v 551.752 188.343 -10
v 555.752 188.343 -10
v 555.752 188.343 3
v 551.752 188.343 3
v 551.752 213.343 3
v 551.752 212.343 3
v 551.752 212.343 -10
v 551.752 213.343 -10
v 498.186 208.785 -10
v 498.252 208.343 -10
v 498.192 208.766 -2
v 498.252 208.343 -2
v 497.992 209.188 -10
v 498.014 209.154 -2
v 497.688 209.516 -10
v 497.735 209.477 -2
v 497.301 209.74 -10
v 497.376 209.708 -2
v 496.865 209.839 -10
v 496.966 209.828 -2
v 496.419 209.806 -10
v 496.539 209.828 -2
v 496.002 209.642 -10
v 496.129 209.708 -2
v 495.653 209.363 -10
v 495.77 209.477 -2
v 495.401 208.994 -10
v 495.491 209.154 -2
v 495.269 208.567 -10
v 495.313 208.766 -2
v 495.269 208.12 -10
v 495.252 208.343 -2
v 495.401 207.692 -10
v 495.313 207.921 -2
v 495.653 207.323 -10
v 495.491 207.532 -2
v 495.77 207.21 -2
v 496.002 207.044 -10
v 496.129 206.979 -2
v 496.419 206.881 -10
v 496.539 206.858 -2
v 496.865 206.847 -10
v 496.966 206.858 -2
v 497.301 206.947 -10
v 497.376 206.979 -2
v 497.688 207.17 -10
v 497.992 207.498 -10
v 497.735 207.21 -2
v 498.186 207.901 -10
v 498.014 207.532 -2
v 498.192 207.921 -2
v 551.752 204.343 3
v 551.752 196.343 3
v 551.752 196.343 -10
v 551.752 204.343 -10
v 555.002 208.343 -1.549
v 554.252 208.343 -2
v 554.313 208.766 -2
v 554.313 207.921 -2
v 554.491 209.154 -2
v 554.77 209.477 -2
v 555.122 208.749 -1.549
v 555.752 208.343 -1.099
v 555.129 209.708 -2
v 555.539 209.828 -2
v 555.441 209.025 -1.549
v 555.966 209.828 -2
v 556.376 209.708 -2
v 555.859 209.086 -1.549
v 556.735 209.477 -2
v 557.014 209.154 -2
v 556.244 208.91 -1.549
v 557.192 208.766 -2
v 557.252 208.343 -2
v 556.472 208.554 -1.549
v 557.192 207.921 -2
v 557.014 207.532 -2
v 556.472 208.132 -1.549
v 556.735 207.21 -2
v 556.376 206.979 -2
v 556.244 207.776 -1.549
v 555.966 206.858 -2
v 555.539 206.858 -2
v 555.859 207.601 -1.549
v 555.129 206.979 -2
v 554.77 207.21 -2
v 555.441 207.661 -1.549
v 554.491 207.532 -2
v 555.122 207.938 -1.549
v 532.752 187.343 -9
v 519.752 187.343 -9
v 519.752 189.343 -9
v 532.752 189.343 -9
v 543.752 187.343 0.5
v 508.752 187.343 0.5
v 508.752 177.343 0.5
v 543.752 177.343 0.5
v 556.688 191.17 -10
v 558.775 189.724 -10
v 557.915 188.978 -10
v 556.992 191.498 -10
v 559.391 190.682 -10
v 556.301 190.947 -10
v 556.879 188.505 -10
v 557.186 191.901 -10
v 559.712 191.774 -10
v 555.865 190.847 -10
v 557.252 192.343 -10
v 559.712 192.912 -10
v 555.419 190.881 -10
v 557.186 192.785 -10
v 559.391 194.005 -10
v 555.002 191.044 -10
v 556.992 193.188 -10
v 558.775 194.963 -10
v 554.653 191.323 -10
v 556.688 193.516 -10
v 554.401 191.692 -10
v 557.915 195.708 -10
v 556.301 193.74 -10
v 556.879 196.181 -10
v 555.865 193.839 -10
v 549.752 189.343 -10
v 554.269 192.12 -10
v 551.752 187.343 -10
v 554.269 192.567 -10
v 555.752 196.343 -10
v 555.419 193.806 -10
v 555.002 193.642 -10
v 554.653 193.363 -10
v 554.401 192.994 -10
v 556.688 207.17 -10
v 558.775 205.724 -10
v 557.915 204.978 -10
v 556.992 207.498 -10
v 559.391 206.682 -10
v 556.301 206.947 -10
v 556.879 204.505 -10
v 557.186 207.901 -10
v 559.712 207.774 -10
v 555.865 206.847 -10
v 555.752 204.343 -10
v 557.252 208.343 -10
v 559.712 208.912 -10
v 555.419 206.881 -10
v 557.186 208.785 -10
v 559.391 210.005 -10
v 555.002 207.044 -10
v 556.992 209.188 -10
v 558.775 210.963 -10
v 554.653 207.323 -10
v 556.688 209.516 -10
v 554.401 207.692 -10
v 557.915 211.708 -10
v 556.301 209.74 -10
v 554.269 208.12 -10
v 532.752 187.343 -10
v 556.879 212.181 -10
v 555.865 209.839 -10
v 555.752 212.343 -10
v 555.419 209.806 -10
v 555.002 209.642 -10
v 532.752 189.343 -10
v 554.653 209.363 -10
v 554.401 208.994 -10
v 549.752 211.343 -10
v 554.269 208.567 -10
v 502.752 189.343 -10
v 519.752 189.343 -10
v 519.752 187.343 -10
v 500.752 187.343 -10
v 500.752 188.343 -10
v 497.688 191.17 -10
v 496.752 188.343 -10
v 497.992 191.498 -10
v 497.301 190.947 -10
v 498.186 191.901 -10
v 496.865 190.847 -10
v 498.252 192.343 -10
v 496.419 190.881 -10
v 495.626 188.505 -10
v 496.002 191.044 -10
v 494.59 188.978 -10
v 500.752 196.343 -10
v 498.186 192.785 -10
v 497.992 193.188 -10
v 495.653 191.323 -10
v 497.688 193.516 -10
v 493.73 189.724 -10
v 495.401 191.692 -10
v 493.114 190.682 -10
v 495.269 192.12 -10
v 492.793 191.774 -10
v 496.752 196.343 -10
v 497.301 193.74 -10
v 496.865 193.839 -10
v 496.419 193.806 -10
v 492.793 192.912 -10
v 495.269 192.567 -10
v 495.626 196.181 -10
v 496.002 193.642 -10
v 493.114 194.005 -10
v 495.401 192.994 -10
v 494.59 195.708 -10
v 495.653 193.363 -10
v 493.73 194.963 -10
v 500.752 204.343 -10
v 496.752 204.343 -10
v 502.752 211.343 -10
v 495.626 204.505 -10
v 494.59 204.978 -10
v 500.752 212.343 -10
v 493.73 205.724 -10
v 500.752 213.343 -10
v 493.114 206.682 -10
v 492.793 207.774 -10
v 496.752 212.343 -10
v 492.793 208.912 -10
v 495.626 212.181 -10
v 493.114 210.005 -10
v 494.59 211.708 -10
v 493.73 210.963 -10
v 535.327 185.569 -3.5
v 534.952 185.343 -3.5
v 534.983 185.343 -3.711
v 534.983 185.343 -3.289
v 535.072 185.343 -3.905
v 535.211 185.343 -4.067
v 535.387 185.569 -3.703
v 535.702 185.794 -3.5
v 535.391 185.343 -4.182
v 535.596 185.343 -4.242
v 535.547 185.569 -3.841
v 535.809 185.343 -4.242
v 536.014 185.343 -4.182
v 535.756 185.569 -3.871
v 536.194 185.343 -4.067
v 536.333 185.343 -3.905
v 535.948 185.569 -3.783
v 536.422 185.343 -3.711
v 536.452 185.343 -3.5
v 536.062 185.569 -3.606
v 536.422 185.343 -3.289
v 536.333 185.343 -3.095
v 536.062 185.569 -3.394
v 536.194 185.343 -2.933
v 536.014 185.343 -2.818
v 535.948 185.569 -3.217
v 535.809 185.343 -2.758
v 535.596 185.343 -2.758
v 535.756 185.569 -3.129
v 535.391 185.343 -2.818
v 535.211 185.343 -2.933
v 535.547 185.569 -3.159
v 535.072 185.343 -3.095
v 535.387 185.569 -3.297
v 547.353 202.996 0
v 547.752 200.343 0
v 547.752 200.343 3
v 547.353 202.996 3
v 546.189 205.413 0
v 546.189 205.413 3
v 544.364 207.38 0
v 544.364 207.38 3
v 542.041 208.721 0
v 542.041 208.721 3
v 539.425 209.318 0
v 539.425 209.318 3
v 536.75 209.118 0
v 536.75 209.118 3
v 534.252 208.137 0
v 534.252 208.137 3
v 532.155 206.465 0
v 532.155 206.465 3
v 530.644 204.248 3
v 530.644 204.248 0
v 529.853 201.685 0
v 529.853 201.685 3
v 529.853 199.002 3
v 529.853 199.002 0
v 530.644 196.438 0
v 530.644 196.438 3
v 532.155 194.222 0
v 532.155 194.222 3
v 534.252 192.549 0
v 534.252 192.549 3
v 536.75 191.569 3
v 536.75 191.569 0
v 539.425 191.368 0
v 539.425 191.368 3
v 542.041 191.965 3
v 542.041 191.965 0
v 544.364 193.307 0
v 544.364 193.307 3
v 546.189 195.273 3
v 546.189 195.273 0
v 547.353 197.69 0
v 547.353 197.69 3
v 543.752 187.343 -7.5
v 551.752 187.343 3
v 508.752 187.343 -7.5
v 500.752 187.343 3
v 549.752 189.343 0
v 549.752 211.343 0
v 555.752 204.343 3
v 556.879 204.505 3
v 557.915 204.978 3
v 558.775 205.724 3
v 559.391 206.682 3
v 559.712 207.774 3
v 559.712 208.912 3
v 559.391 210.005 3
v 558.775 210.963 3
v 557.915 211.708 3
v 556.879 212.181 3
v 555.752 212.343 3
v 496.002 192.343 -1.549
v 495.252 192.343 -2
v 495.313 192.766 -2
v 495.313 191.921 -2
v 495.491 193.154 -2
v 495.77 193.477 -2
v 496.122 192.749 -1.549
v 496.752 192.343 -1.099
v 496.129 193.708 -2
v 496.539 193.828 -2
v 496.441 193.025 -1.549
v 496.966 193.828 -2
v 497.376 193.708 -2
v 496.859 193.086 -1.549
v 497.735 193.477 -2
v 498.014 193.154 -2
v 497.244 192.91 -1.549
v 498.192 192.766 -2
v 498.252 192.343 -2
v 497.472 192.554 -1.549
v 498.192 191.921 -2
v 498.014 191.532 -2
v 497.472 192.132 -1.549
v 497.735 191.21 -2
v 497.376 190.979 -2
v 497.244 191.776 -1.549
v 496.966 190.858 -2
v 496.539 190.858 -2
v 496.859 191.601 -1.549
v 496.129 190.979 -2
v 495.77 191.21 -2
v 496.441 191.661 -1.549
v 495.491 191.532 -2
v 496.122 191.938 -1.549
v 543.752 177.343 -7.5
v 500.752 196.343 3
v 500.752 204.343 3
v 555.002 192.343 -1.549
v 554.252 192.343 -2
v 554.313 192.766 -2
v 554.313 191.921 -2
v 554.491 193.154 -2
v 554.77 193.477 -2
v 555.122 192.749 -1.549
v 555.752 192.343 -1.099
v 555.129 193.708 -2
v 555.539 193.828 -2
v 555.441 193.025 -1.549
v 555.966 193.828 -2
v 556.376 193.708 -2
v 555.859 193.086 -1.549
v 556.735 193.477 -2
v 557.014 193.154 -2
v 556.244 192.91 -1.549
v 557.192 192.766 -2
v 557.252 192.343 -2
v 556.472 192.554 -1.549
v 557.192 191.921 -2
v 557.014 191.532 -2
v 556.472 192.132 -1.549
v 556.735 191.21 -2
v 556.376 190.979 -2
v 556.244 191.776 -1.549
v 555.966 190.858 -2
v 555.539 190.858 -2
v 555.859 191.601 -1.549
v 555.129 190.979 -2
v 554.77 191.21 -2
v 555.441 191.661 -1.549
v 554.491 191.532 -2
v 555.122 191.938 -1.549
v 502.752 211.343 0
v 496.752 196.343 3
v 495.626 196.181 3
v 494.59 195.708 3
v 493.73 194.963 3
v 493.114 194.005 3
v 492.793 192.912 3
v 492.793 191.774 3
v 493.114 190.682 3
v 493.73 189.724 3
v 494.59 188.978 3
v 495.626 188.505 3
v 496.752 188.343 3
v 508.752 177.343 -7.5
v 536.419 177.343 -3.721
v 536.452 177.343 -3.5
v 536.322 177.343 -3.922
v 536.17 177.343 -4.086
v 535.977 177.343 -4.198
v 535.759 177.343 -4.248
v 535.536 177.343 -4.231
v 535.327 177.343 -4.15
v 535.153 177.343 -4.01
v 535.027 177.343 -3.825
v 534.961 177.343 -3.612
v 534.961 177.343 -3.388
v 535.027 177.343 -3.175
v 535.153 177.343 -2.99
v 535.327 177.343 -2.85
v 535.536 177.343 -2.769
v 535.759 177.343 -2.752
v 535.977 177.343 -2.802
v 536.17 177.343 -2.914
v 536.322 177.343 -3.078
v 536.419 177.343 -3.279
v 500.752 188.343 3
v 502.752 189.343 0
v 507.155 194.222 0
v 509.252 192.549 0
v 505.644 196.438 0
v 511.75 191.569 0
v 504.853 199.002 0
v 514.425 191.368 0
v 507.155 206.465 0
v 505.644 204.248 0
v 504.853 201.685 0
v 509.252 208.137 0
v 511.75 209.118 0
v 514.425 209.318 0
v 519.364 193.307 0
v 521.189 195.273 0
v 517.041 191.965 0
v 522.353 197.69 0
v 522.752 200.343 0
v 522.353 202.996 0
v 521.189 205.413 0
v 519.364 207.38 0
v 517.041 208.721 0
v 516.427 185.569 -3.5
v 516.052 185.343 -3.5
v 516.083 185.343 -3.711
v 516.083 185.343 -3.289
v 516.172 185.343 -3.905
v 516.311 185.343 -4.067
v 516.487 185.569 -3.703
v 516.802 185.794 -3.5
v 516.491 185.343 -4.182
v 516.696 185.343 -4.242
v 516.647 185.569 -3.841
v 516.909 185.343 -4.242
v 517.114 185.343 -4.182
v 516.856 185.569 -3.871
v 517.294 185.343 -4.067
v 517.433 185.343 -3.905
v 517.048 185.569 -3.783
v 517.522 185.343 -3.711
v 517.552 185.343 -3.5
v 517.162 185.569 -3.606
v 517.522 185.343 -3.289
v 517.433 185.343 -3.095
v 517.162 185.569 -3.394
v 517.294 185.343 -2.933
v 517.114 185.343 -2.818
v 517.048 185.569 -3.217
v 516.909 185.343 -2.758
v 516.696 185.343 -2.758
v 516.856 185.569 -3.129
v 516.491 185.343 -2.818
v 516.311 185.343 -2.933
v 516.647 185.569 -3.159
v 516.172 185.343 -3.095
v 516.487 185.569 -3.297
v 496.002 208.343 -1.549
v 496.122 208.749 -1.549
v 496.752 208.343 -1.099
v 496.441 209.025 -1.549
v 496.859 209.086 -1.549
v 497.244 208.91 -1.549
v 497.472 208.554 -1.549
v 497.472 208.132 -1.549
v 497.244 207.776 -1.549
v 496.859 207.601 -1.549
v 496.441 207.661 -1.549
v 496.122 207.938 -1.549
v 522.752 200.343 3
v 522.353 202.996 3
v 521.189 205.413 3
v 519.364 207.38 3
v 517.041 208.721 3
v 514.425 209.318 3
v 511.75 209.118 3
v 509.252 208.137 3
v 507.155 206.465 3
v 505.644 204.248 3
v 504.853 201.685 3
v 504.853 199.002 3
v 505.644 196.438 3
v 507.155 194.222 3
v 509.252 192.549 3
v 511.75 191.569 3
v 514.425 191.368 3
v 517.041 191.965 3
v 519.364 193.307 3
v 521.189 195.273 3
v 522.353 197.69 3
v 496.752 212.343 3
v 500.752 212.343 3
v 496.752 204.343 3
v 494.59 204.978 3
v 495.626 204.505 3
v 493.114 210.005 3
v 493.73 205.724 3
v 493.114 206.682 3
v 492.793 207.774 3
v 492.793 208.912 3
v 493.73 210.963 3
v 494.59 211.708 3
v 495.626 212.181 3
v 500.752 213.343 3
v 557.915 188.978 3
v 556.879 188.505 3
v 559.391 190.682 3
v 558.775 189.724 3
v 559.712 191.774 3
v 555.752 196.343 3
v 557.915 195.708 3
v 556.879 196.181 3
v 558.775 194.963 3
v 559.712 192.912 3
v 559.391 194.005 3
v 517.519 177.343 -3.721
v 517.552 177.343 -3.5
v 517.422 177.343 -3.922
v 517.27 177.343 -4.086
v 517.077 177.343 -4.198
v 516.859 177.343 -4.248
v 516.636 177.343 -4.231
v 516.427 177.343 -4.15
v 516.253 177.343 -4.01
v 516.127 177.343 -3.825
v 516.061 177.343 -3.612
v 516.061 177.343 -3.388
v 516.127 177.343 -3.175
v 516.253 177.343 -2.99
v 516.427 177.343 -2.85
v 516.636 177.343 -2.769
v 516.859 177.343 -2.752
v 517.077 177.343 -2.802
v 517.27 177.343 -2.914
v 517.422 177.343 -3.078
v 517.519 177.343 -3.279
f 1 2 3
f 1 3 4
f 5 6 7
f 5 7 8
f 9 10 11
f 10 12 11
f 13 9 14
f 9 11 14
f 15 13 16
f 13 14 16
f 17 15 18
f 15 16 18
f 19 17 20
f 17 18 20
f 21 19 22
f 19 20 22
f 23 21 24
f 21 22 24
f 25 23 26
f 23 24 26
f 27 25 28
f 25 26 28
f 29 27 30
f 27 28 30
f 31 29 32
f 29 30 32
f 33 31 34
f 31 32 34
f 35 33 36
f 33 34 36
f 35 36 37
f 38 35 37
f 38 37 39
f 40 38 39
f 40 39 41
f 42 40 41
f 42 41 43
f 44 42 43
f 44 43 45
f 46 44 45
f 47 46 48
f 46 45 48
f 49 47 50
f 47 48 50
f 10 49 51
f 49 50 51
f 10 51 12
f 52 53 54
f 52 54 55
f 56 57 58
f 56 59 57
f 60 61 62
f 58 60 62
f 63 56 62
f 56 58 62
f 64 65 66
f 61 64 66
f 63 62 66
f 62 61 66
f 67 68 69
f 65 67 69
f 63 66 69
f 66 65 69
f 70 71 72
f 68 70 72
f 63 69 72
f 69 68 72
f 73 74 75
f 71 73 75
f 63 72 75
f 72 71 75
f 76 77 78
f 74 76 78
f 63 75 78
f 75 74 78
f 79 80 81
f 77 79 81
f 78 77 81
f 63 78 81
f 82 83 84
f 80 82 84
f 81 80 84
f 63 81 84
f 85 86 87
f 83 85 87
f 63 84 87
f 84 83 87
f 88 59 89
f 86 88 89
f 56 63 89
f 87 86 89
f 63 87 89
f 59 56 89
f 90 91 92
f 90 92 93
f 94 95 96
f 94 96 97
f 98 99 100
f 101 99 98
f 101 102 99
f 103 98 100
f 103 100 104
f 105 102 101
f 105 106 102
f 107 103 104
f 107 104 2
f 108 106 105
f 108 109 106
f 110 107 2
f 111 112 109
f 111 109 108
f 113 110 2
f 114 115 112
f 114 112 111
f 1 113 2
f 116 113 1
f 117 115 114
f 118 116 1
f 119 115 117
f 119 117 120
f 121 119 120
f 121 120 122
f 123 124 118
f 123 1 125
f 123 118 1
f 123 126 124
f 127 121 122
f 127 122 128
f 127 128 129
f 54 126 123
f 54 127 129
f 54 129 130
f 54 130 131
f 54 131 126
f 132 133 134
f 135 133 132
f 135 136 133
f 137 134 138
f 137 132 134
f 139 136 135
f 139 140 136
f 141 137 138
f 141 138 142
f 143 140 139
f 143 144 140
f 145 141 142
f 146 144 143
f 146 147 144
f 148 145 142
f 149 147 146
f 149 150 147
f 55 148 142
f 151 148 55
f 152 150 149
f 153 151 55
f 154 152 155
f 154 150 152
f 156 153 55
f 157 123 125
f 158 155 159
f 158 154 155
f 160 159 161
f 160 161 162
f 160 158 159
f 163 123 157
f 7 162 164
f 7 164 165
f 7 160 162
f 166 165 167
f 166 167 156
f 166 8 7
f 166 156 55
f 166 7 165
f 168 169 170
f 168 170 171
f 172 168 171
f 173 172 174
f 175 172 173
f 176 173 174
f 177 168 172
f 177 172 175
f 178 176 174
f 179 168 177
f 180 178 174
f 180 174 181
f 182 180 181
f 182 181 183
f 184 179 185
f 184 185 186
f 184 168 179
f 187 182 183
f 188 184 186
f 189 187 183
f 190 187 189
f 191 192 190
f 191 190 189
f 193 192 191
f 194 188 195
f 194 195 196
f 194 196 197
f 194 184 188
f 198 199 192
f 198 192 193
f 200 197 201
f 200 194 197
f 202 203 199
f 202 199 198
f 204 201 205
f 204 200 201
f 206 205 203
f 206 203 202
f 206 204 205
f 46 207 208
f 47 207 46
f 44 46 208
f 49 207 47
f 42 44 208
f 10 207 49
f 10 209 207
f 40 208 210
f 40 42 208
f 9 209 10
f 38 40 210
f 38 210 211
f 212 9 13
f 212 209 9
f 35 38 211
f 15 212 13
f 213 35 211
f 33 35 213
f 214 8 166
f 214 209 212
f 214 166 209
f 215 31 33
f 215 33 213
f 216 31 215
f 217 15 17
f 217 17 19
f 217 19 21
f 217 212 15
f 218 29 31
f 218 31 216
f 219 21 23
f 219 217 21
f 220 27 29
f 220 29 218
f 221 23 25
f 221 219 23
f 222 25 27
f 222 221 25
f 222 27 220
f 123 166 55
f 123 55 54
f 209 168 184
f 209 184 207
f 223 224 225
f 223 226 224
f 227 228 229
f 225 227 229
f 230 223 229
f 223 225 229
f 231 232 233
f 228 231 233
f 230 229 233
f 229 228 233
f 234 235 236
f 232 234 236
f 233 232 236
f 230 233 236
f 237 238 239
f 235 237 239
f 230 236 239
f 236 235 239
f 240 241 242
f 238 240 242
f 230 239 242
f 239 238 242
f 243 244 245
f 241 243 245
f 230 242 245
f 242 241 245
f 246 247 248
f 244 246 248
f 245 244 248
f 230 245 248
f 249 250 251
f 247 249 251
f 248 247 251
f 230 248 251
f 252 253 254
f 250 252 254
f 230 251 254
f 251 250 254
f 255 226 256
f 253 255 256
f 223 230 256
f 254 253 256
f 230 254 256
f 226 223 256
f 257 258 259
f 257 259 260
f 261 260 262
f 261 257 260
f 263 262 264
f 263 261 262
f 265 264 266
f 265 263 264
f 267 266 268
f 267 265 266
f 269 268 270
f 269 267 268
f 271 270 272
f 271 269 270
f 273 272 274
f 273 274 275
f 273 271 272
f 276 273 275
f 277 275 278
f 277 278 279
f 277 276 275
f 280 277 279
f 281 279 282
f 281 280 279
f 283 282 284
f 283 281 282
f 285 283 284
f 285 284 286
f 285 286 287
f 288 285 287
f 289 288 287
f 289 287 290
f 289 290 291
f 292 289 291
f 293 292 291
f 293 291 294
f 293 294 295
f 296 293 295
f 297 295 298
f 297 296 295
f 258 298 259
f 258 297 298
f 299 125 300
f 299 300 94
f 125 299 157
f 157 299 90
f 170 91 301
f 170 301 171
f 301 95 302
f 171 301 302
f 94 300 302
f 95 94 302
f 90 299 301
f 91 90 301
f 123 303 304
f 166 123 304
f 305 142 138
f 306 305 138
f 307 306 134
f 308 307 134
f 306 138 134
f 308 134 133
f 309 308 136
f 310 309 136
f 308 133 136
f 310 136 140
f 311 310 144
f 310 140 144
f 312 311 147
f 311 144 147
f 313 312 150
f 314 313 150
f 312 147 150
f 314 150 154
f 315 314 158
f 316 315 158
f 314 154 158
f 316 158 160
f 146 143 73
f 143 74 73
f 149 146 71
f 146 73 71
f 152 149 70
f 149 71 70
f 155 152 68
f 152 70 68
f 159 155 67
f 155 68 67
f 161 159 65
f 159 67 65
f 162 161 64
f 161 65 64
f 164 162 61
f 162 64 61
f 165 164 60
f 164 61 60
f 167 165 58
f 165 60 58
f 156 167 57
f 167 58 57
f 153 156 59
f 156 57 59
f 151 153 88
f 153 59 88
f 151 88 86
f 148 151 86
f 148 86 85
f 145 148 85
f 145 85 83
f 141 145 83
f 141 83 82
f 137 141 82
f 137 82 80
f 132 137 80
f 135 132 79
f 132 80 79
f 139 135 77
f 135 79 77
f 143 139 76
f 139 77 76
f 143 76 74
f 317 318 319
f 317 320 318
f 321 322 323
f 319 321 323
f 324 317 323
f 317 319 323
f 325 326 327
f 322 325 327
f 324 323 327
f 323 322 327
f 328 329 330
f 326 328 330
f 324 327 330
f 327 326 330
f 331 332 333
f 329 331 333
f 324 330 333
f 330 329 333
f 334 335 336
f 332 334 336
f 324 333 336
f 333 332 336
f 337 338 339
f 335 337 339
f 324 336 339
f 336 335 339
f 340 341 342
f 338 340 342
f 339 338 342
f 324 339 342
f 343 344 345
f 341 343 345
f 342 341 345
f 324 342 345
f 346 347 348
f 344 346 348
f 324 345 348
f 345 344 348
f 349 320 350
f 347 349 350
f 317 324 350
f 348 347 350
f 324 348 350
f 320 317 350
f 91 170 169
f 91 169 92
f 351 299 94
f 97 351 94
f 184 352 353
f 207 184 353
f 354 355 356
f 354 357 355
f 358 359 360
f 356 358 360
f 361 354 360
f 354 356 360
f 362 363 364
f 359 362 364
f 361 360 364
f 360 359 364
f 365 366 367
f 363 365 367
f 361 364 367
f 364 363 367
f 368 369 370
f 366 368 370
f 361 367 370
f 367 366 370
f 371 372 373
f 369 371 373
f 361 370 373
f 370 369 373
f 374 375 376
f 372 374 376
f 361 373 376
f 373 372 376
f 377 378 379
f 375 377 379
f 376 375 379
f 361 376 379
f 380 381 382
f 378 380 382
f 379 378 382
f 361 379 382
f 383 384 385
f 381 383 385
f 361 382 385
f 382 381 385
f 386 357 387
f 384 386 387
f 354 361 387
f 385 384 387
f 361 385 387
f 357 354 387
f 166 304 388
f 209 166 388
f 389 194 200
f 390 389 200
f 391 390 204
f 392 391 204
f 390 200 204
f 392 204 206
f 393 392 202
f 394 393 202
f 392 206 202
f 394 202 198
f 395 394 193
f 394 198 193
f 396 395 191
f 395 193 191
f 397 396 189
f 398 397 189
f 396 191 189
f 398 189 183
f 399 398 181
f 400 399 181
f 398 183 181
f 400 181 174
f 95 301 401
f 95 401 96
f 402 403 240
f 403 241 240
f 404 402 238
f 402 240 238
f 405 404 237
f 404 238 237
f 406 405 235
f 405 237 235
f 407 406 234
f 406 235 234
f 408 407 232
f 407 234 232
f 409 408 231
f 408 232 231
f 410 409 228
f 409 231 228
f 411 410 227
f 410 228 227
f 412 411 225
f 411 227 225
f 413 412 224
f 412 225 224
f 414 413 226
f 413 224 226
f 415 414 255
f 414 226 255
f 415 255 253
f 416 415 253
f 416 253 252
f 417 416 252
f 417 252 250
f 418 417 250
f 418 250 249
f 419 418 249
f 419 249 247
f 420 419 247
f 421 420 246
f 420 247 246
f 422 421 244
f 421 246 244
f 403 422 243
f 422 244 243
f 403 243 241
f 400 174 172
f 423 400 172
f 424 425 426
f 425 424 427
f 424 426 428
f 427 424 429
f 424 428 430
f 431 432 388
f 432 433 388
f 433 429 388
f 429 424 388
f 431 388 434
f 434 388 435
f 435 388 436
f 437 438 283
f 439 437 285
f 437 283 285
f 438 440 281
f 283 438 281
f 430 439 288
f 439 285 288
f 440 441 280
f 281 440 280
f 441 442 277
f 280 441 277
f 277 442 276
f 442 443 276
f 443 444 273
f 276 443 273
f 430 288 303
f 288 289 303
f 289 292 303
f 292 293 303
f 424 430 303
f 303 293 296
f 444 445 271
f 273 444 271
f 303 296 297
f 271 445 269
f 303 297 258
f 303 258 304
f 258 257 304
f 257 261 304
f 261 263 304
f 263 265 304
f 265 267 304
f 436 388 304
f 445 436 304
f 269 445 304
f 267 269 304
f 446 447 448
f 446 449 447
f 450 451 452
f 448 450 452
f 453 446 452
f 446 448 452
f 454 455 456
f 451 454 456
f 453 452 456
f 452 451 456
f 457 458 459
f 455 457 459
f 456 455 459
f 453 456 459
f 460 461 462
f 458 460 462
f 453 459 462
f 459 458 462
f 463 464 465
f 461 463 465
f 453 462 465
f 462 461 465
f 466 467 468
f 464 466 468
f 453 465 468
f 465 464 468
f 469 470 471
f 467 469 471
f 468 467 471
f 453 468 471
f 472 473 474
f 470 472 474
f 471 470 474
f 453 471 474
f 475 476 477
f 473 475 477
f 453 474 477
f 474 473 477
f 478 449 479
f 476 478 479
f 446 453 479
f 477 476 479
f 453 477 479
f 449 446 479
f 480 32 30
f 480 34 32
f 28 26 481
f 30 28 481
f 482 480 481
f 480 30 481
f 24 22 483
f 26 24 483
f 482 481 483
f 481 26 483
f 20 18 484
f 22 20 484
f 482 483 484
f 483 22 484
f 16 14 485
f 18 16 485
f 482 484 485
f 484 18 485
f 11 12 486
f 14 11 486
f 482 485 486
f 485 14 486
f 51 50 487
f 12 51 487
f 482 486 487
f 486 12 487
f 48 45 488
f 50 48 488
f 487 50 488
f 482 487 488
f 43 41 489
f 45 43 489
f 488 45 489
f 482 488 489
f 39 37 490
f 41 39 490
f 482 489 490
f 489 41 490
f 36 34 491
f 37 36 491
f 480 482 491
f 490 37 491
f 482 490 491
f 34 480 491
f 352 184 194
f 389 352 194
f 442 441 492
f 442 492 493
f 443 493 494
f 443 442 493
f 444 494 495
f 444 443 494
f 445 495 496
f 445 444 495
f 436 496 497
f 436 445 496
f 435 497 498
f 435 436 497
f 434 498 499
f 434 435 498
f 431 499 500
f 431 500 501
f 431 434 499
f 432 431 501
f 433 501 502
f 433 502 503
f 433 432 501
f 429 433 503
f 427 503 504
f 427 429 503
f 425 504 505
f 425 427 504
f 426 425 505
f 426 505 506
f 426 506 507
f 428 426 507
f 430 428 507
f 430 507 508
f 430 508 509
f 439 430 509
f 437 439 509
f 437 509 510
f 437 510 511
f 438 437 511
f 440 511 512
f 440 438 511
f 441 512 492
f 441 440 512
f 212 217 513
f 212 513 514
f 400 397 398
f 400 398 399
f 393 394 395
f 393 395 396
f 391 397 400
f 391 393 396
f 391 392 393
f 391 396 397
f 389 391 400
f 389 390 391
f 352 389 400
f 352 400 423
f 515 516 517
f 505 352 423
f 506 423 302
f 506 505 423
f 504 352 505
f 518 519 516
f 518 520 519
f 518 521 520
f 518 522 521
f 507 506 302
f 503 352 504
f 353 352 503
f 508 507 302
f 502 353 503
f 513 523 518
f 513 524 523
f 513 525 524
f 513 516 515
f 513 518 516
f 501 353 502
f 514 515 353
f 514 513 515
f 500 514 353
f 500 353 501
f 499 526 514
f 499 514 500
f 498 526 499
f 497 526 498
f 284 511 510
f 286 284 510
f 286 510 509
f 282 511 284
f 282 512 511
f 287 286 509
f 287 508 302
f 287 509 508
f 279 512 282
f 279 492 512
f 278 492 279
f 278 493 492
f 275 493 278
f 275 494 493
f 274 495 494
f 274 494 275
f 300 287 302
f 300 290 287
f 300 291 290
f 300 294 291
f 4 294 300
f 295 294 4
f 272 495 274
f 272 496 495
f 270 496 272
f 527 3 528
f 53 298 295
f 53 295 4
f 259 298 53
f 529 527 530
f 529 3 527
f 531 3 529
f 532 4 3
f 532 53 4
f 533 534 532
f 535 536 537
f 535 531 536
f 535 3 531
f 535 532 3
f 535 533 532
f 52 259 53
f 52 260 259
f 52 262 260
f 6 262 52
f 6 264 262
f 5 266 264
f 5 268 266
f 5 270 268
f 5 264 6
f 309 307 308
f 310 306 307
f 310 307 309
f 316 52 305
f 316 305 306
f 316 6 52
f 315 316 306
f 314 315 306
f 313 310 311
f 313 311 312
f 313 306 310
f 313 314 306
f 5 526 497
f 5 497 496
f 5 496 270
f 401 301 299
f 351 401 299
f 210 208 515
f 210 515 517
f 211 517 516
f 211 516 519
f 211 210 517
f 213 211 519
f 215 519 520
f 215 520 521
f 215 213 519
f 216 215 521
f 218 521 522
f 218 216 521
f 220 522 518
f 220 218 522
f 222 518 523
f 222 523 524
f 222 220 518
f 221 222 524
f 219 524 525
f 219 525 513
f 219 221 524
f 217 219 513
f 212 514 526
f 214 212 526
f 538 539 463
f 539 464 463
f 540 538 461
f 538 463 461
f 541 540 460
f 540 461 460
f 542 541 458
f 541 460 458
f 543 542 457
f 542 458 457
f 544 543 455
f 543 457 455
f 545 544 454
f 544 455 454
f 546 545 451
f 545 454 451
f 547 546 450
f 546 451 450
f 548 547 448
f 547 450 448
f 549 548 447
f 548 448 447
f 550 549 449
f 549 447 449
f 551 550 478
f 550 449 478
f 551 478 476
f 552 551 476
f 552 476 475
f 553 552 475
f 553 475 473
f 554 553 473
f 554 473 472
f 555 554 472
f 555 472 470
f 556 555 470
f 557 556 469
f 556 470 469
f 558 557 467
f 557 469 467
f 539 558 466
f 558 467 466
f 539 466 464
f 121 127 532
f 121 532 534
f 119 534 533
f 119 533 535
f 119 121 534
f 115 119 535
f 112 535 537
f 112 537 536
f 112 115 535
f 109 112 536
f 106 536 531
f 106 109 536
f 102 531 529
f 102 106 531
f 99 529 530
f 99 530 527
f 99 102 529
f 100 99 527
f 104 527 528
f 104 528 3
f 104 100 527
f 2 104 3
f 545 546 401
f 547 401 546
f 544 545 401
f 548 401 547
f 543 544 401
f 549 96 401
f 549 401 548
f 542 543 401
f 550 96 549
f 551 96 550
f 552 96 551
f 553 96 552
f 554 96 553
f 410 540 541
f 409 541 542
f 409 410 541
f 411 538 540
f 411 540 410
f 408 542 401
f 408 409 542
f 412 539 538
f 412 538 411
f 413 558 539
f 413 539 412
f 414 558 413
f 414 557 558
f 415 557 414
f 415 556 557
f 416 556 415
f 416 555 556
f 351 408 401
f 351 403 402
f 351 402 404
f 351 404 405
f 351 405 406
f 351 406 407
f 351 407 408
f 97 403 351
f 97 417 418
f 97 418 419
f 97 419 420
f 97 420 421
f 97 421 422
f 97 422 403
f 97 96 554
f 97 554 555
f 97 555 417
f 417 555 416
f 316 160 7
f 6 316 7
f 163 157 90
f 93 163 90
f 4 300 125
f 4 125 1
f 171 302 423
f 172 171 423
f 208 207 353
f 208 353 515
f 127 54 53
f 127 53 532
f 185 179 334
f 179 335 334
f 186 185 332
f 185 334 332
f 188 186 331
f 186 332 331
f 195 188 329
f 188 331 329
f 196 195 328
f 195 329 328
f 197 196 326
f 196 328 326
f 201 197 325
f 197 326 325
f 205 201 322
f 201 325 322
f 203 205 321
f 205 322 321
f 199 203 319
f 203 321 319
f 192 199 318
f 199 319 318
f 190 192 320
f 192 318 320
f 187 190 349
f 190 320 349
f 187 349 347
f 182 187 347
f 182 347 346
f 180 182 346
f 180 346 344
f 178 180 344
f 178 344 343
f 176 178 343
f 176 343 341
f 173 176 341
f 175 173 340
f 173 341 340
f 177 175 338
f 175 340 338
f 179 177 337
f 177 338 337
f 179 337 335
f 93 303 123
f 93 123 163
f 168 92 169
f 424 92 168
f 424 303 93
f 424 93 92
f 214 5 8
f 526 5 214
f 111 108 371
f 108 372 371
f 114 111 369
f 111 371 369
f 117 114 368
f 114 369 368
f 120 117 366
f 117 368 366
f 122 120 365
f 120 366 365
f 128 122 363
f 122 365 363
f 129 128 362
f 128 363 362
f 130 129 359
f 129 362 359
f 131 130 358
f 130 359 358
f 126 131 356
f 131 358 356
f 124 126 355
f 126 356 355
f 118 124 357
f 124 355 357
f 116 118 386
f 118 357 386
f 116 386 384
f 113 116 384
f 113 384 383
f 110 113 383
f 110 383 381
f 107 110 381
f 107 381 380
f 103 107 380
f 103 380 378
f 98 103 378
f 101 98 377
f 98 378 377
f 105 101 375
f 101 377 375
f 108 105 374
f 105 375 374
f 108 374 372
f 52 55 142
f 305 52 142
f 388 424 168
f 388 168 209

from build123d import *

# Parameters (mm, degrees)
SKIZZE1_W                            = 51
SKIZZE1_H                            = 26
SKIZZE1_R                            = 9
AUFSATZ_LINEAR_AUSTRAGEN1_DEPTH      = 3
SKIZZE3_W                            = 51
SKIZZE3_H                            = 26
SKIZZE3_W_2                          = 47
SKIZZE3_H_2                          = 22
AUFSATZ_LINEAR_AUSTRAGEN3_DEPTH      = 10
AUFSATZ_LINEAR_AUSTRAGEN4_DEPTH      = 13
F_3_0_3_DURCHMESSER_BOHRUNG1_D       = 3
F_3_0_3_DURCHMESSER_BOHRUNG1_DEPTH   = 8
F_3_0_3_DURCHMESSER_BOHRUNG1_TIP     = 0.901290929
SCHNITT_LINEAR_AUSTRAGEN1_REACH      = 562.445
SKIZZE8_W                            = 13
SKIZZE8_H                            = 1
SKIZZE10_W                           = 35
SKIZZE10_H                           = 8
AUFSATZ_LINEAR_AUSTRAGEN5_DEPTH      = 10
F_1_5_1_5_DURCHMESSER_BOHRUNG1_D     = 1.5
F_1_5_1_5_DURCHMESSER_BOHRUNG1_DEPTH = 8
F_1_5_1_5_DURCHMESSER_BOHRUNG1_TIP   = 0.450645464


with BuildPart() as part:
    # Skizze1 → Aufsatz-Linear austragen1 (new body)
    with BuildSketch(Plane.XY):
        with Locations((526.252498469, 200.343199998)):
            Rectangle(SKIZZE1_W, SKIZZE1_H)
        with Locations((513.752498469, 200.343199998)):
            Circle(SKIZZE1_R, mode=Mode.SUBTRACT)
        with Locations((538.752498469, 200.343199998)):
            Circle(SKIZZE1_R, mode=Mode.SUBTRACT)
    extrude(amount=AUFSATZ_LINEAR_AUSTRAGEN1_DEPTH)

    # Skizze3 → Aufsatz-Linear austragen3 (add)
    with BuildSketch(Plane(origin=(0, 0, 0), x_dir=(-1, 0, 0), z_dir=(0, 0, -1))):
        with Locations((-526.252498469, 200.343199998)):
            Rectangle(SKIZZE3_W, SKIZZE3_H)
        with Locations((-526.252498469, 200.343199998)):
            Rectangle(SKIZZE3_W_2, SKIZZE3_H_2, mode=Mode.SUBTRACT)
    extrude(amount=AUFSATZ_LINEAR_AUSTRAGEN3_DEPTH)

    # Skizze4 → Aufsatz-Linear austragen4 (add)
    with BuildSketch(Plane(origin=(0, 0, -10), x_dir=(-1, 0, 0), z_dir=(0, 0, -1))):
        with BuildLine():
            Line((-496.752498469, 212.343199998), (-500.752498469, 212.343199998))
            Line((-500.752498469, 212.343199998), (-500.752498469, 204.343199998))
            Line((-500.752498469, 204.343199998), (-496.752498469, 204.343199998))
            ThreePointArc((-496.752498469, 204.343199998), (-492.752498469, 208.343199998), (-496.752498469, 212.343199998))
        make_face()
        with BuildLine():
            Line((-500.752498469, 196.343199998), (-496.752498469, 196.343199998))
            ThreePointArc((-496.752498469, 196.343199998), (-492.752498469, 192.343199998), (-496.752498469, 188.343199998))
            Line((-496.752498469, 188.343199998), (-500.752498469, 188.343199998))
            Line((-500.752498469, 188.343199998), (-500.752498469, 196.343199998))
        make_face()
        with BuildLine():
            Line((-551.752498469, 188.343199998), (-551.752498469, 196.343199998))
            Line((-551.752498469, 196.343199998), (-555.752498469, 196.343199998))
            ThreePointArc((-555.752498469, 196.343199998), (-559.752498469, 192.343199998), (-555.752498469, 188.343199998))
            Line((-555.752498469, 188.343199998), (-551.752498469, 188.343199998))
        make_face()
        with BuildLine():
            Line((-551.752498469, 204.343199998), (-555.752498469, 204.343199998))
            ThreePointArc((-555.752498469, 204.343199998), (-559.752498469, 208.343199998), (-555.752498469, 212.343199998))
            Line((-555.752498469, 212.343199998), (-551.752498469, 212.343199998))
            Line((-551.752498469, 212.343199998), (-551.752498469, 204.343199998))
        make_face()
    extrude(amount=-AUFSATZ_LINEAR_AUSTRAGEN4_DEPTH)

    # Ø3.0 (3) Durchmesser Bohrung1
    with Locations(Plane(origin=(0, 0, -10), x_dir=(-1, 0, 0), z_dir=(0, 0, -1))):
        with Locations((-555.752498469, 208.343199998), (-555.752498469, 192.343199998), (-496.752498469, 208.343199998), (-496.752498469, 192.343199998)):
            Hole(F_3_0_3_DURCHMESSER_BOHRUNG1_D / 2, depth=F_3_0_3_DURCHMESSER_BOHRUNG1_DEPTH)
            with Locations((0, 0, -(F_3_0_3_DURCHMESSER_BOHRUNG1_DEPTH + F_3_0_3_DURCHMESSER_BOHRUNG1_TIP / 2))):  # 118° drill point
                Cone(0, F_3_0_3_DURCHMESSER_BOHRUNG1_D / 2, F_3_0_3_DURCHMESSER_BOHRUNG1_TIP, mode=Mode.SUBTRACT)

    # Skizze8 → Schnitt-Linear austragen1 (cut, up to next)
    with BuildSketch(Plane.XZ.offset(-187.343199998), mode=Mode.PRIVATE) as schnitt_linear_austragen1_sk1:
        with Locations((526.252498469, -9.5)):
            Rectangle(SKIZZE8_W, SKIZZE8_H)
    schnitt_linear_austragen1_tool1 = extrude(schnitt_linear_austragen1_sk1.sketch, amount=-SCHNITT_LINEAR_AUSTRAGEN1_REACH, mode=Mode.PRIVATE) & part.part
    add(schnitt_linear_austragen1_tool1.solids().sort_by_distance((526.252498, 187.3432, -9.5))[0], mode=Mode.SUBTRACT)

    # Skizze10 → Aufsatz-Linear austragen5 (add)
    with BuildSketch(Plane.XZ.offset(-187.343199998)):
        with Locations((526.252498469, -3.5)):
            Rectangle(SKIZZE10_W, SKIZZE10_H)
    extrude(amount=AUFSATZ_LINEAR_AUSTRAGEN5_DEPTH)

    # Ø1.5 (1.5) Durchmesser Bohrung1
    with Locations(Plane(origin=(0, 177.343199998, 0), x_dir=(-1, 0, 0), z_dir=(0, -1, 0))):
        with Locations((-535.702498469, 3.5), (-516.802498469, 3.5)):
            Hole(F_1_5_1_5_DURCHMESSER_BOHRUNG1_D / 2, depth=F_1_5_1_5_DURCHMESSER_BOHRUNG1_DEPTH)
            with Locations((0, 0, -(F_1_5_1_5_DURCHMESSER_BOHRUNG1_DEPTH + F_1_5_1_5_DURCHMESSER_BOHRUNG1_TIP / 2))):  # 118° drill point
                Cone(0, F_1_5_1_5_DURCHMESSER_BOHRUNG1_D / 2, F_1_5_1_5_DURCHMESSER_BOHRUNG1_TIP, mode=Mode.SUBTRACT)


solid = part.part
